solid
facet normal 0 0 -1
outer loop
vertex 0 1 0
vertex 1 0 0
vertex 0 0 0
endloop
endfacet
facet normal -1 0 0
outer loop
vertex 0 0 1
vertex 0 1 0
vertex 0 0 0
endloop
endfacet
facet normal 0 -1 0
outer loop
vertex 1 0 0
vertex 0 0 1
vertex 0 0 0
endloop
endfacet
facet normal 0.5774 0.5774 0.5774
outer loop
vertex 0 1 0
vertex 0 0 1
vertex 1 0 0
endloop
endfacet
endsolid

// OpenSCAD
// Generated by scadwright. Do not hand-edit —
// edit the Python source and regenerate.

polyhedron(points=[[0, 0, 0], [1, 0, 0], [0, 1, 0], [0, 0, 1]], faces=[[0, 1, 2], [0, 2, 3], [0, 3, 1], [1, 3, 2]], convexity=2);
